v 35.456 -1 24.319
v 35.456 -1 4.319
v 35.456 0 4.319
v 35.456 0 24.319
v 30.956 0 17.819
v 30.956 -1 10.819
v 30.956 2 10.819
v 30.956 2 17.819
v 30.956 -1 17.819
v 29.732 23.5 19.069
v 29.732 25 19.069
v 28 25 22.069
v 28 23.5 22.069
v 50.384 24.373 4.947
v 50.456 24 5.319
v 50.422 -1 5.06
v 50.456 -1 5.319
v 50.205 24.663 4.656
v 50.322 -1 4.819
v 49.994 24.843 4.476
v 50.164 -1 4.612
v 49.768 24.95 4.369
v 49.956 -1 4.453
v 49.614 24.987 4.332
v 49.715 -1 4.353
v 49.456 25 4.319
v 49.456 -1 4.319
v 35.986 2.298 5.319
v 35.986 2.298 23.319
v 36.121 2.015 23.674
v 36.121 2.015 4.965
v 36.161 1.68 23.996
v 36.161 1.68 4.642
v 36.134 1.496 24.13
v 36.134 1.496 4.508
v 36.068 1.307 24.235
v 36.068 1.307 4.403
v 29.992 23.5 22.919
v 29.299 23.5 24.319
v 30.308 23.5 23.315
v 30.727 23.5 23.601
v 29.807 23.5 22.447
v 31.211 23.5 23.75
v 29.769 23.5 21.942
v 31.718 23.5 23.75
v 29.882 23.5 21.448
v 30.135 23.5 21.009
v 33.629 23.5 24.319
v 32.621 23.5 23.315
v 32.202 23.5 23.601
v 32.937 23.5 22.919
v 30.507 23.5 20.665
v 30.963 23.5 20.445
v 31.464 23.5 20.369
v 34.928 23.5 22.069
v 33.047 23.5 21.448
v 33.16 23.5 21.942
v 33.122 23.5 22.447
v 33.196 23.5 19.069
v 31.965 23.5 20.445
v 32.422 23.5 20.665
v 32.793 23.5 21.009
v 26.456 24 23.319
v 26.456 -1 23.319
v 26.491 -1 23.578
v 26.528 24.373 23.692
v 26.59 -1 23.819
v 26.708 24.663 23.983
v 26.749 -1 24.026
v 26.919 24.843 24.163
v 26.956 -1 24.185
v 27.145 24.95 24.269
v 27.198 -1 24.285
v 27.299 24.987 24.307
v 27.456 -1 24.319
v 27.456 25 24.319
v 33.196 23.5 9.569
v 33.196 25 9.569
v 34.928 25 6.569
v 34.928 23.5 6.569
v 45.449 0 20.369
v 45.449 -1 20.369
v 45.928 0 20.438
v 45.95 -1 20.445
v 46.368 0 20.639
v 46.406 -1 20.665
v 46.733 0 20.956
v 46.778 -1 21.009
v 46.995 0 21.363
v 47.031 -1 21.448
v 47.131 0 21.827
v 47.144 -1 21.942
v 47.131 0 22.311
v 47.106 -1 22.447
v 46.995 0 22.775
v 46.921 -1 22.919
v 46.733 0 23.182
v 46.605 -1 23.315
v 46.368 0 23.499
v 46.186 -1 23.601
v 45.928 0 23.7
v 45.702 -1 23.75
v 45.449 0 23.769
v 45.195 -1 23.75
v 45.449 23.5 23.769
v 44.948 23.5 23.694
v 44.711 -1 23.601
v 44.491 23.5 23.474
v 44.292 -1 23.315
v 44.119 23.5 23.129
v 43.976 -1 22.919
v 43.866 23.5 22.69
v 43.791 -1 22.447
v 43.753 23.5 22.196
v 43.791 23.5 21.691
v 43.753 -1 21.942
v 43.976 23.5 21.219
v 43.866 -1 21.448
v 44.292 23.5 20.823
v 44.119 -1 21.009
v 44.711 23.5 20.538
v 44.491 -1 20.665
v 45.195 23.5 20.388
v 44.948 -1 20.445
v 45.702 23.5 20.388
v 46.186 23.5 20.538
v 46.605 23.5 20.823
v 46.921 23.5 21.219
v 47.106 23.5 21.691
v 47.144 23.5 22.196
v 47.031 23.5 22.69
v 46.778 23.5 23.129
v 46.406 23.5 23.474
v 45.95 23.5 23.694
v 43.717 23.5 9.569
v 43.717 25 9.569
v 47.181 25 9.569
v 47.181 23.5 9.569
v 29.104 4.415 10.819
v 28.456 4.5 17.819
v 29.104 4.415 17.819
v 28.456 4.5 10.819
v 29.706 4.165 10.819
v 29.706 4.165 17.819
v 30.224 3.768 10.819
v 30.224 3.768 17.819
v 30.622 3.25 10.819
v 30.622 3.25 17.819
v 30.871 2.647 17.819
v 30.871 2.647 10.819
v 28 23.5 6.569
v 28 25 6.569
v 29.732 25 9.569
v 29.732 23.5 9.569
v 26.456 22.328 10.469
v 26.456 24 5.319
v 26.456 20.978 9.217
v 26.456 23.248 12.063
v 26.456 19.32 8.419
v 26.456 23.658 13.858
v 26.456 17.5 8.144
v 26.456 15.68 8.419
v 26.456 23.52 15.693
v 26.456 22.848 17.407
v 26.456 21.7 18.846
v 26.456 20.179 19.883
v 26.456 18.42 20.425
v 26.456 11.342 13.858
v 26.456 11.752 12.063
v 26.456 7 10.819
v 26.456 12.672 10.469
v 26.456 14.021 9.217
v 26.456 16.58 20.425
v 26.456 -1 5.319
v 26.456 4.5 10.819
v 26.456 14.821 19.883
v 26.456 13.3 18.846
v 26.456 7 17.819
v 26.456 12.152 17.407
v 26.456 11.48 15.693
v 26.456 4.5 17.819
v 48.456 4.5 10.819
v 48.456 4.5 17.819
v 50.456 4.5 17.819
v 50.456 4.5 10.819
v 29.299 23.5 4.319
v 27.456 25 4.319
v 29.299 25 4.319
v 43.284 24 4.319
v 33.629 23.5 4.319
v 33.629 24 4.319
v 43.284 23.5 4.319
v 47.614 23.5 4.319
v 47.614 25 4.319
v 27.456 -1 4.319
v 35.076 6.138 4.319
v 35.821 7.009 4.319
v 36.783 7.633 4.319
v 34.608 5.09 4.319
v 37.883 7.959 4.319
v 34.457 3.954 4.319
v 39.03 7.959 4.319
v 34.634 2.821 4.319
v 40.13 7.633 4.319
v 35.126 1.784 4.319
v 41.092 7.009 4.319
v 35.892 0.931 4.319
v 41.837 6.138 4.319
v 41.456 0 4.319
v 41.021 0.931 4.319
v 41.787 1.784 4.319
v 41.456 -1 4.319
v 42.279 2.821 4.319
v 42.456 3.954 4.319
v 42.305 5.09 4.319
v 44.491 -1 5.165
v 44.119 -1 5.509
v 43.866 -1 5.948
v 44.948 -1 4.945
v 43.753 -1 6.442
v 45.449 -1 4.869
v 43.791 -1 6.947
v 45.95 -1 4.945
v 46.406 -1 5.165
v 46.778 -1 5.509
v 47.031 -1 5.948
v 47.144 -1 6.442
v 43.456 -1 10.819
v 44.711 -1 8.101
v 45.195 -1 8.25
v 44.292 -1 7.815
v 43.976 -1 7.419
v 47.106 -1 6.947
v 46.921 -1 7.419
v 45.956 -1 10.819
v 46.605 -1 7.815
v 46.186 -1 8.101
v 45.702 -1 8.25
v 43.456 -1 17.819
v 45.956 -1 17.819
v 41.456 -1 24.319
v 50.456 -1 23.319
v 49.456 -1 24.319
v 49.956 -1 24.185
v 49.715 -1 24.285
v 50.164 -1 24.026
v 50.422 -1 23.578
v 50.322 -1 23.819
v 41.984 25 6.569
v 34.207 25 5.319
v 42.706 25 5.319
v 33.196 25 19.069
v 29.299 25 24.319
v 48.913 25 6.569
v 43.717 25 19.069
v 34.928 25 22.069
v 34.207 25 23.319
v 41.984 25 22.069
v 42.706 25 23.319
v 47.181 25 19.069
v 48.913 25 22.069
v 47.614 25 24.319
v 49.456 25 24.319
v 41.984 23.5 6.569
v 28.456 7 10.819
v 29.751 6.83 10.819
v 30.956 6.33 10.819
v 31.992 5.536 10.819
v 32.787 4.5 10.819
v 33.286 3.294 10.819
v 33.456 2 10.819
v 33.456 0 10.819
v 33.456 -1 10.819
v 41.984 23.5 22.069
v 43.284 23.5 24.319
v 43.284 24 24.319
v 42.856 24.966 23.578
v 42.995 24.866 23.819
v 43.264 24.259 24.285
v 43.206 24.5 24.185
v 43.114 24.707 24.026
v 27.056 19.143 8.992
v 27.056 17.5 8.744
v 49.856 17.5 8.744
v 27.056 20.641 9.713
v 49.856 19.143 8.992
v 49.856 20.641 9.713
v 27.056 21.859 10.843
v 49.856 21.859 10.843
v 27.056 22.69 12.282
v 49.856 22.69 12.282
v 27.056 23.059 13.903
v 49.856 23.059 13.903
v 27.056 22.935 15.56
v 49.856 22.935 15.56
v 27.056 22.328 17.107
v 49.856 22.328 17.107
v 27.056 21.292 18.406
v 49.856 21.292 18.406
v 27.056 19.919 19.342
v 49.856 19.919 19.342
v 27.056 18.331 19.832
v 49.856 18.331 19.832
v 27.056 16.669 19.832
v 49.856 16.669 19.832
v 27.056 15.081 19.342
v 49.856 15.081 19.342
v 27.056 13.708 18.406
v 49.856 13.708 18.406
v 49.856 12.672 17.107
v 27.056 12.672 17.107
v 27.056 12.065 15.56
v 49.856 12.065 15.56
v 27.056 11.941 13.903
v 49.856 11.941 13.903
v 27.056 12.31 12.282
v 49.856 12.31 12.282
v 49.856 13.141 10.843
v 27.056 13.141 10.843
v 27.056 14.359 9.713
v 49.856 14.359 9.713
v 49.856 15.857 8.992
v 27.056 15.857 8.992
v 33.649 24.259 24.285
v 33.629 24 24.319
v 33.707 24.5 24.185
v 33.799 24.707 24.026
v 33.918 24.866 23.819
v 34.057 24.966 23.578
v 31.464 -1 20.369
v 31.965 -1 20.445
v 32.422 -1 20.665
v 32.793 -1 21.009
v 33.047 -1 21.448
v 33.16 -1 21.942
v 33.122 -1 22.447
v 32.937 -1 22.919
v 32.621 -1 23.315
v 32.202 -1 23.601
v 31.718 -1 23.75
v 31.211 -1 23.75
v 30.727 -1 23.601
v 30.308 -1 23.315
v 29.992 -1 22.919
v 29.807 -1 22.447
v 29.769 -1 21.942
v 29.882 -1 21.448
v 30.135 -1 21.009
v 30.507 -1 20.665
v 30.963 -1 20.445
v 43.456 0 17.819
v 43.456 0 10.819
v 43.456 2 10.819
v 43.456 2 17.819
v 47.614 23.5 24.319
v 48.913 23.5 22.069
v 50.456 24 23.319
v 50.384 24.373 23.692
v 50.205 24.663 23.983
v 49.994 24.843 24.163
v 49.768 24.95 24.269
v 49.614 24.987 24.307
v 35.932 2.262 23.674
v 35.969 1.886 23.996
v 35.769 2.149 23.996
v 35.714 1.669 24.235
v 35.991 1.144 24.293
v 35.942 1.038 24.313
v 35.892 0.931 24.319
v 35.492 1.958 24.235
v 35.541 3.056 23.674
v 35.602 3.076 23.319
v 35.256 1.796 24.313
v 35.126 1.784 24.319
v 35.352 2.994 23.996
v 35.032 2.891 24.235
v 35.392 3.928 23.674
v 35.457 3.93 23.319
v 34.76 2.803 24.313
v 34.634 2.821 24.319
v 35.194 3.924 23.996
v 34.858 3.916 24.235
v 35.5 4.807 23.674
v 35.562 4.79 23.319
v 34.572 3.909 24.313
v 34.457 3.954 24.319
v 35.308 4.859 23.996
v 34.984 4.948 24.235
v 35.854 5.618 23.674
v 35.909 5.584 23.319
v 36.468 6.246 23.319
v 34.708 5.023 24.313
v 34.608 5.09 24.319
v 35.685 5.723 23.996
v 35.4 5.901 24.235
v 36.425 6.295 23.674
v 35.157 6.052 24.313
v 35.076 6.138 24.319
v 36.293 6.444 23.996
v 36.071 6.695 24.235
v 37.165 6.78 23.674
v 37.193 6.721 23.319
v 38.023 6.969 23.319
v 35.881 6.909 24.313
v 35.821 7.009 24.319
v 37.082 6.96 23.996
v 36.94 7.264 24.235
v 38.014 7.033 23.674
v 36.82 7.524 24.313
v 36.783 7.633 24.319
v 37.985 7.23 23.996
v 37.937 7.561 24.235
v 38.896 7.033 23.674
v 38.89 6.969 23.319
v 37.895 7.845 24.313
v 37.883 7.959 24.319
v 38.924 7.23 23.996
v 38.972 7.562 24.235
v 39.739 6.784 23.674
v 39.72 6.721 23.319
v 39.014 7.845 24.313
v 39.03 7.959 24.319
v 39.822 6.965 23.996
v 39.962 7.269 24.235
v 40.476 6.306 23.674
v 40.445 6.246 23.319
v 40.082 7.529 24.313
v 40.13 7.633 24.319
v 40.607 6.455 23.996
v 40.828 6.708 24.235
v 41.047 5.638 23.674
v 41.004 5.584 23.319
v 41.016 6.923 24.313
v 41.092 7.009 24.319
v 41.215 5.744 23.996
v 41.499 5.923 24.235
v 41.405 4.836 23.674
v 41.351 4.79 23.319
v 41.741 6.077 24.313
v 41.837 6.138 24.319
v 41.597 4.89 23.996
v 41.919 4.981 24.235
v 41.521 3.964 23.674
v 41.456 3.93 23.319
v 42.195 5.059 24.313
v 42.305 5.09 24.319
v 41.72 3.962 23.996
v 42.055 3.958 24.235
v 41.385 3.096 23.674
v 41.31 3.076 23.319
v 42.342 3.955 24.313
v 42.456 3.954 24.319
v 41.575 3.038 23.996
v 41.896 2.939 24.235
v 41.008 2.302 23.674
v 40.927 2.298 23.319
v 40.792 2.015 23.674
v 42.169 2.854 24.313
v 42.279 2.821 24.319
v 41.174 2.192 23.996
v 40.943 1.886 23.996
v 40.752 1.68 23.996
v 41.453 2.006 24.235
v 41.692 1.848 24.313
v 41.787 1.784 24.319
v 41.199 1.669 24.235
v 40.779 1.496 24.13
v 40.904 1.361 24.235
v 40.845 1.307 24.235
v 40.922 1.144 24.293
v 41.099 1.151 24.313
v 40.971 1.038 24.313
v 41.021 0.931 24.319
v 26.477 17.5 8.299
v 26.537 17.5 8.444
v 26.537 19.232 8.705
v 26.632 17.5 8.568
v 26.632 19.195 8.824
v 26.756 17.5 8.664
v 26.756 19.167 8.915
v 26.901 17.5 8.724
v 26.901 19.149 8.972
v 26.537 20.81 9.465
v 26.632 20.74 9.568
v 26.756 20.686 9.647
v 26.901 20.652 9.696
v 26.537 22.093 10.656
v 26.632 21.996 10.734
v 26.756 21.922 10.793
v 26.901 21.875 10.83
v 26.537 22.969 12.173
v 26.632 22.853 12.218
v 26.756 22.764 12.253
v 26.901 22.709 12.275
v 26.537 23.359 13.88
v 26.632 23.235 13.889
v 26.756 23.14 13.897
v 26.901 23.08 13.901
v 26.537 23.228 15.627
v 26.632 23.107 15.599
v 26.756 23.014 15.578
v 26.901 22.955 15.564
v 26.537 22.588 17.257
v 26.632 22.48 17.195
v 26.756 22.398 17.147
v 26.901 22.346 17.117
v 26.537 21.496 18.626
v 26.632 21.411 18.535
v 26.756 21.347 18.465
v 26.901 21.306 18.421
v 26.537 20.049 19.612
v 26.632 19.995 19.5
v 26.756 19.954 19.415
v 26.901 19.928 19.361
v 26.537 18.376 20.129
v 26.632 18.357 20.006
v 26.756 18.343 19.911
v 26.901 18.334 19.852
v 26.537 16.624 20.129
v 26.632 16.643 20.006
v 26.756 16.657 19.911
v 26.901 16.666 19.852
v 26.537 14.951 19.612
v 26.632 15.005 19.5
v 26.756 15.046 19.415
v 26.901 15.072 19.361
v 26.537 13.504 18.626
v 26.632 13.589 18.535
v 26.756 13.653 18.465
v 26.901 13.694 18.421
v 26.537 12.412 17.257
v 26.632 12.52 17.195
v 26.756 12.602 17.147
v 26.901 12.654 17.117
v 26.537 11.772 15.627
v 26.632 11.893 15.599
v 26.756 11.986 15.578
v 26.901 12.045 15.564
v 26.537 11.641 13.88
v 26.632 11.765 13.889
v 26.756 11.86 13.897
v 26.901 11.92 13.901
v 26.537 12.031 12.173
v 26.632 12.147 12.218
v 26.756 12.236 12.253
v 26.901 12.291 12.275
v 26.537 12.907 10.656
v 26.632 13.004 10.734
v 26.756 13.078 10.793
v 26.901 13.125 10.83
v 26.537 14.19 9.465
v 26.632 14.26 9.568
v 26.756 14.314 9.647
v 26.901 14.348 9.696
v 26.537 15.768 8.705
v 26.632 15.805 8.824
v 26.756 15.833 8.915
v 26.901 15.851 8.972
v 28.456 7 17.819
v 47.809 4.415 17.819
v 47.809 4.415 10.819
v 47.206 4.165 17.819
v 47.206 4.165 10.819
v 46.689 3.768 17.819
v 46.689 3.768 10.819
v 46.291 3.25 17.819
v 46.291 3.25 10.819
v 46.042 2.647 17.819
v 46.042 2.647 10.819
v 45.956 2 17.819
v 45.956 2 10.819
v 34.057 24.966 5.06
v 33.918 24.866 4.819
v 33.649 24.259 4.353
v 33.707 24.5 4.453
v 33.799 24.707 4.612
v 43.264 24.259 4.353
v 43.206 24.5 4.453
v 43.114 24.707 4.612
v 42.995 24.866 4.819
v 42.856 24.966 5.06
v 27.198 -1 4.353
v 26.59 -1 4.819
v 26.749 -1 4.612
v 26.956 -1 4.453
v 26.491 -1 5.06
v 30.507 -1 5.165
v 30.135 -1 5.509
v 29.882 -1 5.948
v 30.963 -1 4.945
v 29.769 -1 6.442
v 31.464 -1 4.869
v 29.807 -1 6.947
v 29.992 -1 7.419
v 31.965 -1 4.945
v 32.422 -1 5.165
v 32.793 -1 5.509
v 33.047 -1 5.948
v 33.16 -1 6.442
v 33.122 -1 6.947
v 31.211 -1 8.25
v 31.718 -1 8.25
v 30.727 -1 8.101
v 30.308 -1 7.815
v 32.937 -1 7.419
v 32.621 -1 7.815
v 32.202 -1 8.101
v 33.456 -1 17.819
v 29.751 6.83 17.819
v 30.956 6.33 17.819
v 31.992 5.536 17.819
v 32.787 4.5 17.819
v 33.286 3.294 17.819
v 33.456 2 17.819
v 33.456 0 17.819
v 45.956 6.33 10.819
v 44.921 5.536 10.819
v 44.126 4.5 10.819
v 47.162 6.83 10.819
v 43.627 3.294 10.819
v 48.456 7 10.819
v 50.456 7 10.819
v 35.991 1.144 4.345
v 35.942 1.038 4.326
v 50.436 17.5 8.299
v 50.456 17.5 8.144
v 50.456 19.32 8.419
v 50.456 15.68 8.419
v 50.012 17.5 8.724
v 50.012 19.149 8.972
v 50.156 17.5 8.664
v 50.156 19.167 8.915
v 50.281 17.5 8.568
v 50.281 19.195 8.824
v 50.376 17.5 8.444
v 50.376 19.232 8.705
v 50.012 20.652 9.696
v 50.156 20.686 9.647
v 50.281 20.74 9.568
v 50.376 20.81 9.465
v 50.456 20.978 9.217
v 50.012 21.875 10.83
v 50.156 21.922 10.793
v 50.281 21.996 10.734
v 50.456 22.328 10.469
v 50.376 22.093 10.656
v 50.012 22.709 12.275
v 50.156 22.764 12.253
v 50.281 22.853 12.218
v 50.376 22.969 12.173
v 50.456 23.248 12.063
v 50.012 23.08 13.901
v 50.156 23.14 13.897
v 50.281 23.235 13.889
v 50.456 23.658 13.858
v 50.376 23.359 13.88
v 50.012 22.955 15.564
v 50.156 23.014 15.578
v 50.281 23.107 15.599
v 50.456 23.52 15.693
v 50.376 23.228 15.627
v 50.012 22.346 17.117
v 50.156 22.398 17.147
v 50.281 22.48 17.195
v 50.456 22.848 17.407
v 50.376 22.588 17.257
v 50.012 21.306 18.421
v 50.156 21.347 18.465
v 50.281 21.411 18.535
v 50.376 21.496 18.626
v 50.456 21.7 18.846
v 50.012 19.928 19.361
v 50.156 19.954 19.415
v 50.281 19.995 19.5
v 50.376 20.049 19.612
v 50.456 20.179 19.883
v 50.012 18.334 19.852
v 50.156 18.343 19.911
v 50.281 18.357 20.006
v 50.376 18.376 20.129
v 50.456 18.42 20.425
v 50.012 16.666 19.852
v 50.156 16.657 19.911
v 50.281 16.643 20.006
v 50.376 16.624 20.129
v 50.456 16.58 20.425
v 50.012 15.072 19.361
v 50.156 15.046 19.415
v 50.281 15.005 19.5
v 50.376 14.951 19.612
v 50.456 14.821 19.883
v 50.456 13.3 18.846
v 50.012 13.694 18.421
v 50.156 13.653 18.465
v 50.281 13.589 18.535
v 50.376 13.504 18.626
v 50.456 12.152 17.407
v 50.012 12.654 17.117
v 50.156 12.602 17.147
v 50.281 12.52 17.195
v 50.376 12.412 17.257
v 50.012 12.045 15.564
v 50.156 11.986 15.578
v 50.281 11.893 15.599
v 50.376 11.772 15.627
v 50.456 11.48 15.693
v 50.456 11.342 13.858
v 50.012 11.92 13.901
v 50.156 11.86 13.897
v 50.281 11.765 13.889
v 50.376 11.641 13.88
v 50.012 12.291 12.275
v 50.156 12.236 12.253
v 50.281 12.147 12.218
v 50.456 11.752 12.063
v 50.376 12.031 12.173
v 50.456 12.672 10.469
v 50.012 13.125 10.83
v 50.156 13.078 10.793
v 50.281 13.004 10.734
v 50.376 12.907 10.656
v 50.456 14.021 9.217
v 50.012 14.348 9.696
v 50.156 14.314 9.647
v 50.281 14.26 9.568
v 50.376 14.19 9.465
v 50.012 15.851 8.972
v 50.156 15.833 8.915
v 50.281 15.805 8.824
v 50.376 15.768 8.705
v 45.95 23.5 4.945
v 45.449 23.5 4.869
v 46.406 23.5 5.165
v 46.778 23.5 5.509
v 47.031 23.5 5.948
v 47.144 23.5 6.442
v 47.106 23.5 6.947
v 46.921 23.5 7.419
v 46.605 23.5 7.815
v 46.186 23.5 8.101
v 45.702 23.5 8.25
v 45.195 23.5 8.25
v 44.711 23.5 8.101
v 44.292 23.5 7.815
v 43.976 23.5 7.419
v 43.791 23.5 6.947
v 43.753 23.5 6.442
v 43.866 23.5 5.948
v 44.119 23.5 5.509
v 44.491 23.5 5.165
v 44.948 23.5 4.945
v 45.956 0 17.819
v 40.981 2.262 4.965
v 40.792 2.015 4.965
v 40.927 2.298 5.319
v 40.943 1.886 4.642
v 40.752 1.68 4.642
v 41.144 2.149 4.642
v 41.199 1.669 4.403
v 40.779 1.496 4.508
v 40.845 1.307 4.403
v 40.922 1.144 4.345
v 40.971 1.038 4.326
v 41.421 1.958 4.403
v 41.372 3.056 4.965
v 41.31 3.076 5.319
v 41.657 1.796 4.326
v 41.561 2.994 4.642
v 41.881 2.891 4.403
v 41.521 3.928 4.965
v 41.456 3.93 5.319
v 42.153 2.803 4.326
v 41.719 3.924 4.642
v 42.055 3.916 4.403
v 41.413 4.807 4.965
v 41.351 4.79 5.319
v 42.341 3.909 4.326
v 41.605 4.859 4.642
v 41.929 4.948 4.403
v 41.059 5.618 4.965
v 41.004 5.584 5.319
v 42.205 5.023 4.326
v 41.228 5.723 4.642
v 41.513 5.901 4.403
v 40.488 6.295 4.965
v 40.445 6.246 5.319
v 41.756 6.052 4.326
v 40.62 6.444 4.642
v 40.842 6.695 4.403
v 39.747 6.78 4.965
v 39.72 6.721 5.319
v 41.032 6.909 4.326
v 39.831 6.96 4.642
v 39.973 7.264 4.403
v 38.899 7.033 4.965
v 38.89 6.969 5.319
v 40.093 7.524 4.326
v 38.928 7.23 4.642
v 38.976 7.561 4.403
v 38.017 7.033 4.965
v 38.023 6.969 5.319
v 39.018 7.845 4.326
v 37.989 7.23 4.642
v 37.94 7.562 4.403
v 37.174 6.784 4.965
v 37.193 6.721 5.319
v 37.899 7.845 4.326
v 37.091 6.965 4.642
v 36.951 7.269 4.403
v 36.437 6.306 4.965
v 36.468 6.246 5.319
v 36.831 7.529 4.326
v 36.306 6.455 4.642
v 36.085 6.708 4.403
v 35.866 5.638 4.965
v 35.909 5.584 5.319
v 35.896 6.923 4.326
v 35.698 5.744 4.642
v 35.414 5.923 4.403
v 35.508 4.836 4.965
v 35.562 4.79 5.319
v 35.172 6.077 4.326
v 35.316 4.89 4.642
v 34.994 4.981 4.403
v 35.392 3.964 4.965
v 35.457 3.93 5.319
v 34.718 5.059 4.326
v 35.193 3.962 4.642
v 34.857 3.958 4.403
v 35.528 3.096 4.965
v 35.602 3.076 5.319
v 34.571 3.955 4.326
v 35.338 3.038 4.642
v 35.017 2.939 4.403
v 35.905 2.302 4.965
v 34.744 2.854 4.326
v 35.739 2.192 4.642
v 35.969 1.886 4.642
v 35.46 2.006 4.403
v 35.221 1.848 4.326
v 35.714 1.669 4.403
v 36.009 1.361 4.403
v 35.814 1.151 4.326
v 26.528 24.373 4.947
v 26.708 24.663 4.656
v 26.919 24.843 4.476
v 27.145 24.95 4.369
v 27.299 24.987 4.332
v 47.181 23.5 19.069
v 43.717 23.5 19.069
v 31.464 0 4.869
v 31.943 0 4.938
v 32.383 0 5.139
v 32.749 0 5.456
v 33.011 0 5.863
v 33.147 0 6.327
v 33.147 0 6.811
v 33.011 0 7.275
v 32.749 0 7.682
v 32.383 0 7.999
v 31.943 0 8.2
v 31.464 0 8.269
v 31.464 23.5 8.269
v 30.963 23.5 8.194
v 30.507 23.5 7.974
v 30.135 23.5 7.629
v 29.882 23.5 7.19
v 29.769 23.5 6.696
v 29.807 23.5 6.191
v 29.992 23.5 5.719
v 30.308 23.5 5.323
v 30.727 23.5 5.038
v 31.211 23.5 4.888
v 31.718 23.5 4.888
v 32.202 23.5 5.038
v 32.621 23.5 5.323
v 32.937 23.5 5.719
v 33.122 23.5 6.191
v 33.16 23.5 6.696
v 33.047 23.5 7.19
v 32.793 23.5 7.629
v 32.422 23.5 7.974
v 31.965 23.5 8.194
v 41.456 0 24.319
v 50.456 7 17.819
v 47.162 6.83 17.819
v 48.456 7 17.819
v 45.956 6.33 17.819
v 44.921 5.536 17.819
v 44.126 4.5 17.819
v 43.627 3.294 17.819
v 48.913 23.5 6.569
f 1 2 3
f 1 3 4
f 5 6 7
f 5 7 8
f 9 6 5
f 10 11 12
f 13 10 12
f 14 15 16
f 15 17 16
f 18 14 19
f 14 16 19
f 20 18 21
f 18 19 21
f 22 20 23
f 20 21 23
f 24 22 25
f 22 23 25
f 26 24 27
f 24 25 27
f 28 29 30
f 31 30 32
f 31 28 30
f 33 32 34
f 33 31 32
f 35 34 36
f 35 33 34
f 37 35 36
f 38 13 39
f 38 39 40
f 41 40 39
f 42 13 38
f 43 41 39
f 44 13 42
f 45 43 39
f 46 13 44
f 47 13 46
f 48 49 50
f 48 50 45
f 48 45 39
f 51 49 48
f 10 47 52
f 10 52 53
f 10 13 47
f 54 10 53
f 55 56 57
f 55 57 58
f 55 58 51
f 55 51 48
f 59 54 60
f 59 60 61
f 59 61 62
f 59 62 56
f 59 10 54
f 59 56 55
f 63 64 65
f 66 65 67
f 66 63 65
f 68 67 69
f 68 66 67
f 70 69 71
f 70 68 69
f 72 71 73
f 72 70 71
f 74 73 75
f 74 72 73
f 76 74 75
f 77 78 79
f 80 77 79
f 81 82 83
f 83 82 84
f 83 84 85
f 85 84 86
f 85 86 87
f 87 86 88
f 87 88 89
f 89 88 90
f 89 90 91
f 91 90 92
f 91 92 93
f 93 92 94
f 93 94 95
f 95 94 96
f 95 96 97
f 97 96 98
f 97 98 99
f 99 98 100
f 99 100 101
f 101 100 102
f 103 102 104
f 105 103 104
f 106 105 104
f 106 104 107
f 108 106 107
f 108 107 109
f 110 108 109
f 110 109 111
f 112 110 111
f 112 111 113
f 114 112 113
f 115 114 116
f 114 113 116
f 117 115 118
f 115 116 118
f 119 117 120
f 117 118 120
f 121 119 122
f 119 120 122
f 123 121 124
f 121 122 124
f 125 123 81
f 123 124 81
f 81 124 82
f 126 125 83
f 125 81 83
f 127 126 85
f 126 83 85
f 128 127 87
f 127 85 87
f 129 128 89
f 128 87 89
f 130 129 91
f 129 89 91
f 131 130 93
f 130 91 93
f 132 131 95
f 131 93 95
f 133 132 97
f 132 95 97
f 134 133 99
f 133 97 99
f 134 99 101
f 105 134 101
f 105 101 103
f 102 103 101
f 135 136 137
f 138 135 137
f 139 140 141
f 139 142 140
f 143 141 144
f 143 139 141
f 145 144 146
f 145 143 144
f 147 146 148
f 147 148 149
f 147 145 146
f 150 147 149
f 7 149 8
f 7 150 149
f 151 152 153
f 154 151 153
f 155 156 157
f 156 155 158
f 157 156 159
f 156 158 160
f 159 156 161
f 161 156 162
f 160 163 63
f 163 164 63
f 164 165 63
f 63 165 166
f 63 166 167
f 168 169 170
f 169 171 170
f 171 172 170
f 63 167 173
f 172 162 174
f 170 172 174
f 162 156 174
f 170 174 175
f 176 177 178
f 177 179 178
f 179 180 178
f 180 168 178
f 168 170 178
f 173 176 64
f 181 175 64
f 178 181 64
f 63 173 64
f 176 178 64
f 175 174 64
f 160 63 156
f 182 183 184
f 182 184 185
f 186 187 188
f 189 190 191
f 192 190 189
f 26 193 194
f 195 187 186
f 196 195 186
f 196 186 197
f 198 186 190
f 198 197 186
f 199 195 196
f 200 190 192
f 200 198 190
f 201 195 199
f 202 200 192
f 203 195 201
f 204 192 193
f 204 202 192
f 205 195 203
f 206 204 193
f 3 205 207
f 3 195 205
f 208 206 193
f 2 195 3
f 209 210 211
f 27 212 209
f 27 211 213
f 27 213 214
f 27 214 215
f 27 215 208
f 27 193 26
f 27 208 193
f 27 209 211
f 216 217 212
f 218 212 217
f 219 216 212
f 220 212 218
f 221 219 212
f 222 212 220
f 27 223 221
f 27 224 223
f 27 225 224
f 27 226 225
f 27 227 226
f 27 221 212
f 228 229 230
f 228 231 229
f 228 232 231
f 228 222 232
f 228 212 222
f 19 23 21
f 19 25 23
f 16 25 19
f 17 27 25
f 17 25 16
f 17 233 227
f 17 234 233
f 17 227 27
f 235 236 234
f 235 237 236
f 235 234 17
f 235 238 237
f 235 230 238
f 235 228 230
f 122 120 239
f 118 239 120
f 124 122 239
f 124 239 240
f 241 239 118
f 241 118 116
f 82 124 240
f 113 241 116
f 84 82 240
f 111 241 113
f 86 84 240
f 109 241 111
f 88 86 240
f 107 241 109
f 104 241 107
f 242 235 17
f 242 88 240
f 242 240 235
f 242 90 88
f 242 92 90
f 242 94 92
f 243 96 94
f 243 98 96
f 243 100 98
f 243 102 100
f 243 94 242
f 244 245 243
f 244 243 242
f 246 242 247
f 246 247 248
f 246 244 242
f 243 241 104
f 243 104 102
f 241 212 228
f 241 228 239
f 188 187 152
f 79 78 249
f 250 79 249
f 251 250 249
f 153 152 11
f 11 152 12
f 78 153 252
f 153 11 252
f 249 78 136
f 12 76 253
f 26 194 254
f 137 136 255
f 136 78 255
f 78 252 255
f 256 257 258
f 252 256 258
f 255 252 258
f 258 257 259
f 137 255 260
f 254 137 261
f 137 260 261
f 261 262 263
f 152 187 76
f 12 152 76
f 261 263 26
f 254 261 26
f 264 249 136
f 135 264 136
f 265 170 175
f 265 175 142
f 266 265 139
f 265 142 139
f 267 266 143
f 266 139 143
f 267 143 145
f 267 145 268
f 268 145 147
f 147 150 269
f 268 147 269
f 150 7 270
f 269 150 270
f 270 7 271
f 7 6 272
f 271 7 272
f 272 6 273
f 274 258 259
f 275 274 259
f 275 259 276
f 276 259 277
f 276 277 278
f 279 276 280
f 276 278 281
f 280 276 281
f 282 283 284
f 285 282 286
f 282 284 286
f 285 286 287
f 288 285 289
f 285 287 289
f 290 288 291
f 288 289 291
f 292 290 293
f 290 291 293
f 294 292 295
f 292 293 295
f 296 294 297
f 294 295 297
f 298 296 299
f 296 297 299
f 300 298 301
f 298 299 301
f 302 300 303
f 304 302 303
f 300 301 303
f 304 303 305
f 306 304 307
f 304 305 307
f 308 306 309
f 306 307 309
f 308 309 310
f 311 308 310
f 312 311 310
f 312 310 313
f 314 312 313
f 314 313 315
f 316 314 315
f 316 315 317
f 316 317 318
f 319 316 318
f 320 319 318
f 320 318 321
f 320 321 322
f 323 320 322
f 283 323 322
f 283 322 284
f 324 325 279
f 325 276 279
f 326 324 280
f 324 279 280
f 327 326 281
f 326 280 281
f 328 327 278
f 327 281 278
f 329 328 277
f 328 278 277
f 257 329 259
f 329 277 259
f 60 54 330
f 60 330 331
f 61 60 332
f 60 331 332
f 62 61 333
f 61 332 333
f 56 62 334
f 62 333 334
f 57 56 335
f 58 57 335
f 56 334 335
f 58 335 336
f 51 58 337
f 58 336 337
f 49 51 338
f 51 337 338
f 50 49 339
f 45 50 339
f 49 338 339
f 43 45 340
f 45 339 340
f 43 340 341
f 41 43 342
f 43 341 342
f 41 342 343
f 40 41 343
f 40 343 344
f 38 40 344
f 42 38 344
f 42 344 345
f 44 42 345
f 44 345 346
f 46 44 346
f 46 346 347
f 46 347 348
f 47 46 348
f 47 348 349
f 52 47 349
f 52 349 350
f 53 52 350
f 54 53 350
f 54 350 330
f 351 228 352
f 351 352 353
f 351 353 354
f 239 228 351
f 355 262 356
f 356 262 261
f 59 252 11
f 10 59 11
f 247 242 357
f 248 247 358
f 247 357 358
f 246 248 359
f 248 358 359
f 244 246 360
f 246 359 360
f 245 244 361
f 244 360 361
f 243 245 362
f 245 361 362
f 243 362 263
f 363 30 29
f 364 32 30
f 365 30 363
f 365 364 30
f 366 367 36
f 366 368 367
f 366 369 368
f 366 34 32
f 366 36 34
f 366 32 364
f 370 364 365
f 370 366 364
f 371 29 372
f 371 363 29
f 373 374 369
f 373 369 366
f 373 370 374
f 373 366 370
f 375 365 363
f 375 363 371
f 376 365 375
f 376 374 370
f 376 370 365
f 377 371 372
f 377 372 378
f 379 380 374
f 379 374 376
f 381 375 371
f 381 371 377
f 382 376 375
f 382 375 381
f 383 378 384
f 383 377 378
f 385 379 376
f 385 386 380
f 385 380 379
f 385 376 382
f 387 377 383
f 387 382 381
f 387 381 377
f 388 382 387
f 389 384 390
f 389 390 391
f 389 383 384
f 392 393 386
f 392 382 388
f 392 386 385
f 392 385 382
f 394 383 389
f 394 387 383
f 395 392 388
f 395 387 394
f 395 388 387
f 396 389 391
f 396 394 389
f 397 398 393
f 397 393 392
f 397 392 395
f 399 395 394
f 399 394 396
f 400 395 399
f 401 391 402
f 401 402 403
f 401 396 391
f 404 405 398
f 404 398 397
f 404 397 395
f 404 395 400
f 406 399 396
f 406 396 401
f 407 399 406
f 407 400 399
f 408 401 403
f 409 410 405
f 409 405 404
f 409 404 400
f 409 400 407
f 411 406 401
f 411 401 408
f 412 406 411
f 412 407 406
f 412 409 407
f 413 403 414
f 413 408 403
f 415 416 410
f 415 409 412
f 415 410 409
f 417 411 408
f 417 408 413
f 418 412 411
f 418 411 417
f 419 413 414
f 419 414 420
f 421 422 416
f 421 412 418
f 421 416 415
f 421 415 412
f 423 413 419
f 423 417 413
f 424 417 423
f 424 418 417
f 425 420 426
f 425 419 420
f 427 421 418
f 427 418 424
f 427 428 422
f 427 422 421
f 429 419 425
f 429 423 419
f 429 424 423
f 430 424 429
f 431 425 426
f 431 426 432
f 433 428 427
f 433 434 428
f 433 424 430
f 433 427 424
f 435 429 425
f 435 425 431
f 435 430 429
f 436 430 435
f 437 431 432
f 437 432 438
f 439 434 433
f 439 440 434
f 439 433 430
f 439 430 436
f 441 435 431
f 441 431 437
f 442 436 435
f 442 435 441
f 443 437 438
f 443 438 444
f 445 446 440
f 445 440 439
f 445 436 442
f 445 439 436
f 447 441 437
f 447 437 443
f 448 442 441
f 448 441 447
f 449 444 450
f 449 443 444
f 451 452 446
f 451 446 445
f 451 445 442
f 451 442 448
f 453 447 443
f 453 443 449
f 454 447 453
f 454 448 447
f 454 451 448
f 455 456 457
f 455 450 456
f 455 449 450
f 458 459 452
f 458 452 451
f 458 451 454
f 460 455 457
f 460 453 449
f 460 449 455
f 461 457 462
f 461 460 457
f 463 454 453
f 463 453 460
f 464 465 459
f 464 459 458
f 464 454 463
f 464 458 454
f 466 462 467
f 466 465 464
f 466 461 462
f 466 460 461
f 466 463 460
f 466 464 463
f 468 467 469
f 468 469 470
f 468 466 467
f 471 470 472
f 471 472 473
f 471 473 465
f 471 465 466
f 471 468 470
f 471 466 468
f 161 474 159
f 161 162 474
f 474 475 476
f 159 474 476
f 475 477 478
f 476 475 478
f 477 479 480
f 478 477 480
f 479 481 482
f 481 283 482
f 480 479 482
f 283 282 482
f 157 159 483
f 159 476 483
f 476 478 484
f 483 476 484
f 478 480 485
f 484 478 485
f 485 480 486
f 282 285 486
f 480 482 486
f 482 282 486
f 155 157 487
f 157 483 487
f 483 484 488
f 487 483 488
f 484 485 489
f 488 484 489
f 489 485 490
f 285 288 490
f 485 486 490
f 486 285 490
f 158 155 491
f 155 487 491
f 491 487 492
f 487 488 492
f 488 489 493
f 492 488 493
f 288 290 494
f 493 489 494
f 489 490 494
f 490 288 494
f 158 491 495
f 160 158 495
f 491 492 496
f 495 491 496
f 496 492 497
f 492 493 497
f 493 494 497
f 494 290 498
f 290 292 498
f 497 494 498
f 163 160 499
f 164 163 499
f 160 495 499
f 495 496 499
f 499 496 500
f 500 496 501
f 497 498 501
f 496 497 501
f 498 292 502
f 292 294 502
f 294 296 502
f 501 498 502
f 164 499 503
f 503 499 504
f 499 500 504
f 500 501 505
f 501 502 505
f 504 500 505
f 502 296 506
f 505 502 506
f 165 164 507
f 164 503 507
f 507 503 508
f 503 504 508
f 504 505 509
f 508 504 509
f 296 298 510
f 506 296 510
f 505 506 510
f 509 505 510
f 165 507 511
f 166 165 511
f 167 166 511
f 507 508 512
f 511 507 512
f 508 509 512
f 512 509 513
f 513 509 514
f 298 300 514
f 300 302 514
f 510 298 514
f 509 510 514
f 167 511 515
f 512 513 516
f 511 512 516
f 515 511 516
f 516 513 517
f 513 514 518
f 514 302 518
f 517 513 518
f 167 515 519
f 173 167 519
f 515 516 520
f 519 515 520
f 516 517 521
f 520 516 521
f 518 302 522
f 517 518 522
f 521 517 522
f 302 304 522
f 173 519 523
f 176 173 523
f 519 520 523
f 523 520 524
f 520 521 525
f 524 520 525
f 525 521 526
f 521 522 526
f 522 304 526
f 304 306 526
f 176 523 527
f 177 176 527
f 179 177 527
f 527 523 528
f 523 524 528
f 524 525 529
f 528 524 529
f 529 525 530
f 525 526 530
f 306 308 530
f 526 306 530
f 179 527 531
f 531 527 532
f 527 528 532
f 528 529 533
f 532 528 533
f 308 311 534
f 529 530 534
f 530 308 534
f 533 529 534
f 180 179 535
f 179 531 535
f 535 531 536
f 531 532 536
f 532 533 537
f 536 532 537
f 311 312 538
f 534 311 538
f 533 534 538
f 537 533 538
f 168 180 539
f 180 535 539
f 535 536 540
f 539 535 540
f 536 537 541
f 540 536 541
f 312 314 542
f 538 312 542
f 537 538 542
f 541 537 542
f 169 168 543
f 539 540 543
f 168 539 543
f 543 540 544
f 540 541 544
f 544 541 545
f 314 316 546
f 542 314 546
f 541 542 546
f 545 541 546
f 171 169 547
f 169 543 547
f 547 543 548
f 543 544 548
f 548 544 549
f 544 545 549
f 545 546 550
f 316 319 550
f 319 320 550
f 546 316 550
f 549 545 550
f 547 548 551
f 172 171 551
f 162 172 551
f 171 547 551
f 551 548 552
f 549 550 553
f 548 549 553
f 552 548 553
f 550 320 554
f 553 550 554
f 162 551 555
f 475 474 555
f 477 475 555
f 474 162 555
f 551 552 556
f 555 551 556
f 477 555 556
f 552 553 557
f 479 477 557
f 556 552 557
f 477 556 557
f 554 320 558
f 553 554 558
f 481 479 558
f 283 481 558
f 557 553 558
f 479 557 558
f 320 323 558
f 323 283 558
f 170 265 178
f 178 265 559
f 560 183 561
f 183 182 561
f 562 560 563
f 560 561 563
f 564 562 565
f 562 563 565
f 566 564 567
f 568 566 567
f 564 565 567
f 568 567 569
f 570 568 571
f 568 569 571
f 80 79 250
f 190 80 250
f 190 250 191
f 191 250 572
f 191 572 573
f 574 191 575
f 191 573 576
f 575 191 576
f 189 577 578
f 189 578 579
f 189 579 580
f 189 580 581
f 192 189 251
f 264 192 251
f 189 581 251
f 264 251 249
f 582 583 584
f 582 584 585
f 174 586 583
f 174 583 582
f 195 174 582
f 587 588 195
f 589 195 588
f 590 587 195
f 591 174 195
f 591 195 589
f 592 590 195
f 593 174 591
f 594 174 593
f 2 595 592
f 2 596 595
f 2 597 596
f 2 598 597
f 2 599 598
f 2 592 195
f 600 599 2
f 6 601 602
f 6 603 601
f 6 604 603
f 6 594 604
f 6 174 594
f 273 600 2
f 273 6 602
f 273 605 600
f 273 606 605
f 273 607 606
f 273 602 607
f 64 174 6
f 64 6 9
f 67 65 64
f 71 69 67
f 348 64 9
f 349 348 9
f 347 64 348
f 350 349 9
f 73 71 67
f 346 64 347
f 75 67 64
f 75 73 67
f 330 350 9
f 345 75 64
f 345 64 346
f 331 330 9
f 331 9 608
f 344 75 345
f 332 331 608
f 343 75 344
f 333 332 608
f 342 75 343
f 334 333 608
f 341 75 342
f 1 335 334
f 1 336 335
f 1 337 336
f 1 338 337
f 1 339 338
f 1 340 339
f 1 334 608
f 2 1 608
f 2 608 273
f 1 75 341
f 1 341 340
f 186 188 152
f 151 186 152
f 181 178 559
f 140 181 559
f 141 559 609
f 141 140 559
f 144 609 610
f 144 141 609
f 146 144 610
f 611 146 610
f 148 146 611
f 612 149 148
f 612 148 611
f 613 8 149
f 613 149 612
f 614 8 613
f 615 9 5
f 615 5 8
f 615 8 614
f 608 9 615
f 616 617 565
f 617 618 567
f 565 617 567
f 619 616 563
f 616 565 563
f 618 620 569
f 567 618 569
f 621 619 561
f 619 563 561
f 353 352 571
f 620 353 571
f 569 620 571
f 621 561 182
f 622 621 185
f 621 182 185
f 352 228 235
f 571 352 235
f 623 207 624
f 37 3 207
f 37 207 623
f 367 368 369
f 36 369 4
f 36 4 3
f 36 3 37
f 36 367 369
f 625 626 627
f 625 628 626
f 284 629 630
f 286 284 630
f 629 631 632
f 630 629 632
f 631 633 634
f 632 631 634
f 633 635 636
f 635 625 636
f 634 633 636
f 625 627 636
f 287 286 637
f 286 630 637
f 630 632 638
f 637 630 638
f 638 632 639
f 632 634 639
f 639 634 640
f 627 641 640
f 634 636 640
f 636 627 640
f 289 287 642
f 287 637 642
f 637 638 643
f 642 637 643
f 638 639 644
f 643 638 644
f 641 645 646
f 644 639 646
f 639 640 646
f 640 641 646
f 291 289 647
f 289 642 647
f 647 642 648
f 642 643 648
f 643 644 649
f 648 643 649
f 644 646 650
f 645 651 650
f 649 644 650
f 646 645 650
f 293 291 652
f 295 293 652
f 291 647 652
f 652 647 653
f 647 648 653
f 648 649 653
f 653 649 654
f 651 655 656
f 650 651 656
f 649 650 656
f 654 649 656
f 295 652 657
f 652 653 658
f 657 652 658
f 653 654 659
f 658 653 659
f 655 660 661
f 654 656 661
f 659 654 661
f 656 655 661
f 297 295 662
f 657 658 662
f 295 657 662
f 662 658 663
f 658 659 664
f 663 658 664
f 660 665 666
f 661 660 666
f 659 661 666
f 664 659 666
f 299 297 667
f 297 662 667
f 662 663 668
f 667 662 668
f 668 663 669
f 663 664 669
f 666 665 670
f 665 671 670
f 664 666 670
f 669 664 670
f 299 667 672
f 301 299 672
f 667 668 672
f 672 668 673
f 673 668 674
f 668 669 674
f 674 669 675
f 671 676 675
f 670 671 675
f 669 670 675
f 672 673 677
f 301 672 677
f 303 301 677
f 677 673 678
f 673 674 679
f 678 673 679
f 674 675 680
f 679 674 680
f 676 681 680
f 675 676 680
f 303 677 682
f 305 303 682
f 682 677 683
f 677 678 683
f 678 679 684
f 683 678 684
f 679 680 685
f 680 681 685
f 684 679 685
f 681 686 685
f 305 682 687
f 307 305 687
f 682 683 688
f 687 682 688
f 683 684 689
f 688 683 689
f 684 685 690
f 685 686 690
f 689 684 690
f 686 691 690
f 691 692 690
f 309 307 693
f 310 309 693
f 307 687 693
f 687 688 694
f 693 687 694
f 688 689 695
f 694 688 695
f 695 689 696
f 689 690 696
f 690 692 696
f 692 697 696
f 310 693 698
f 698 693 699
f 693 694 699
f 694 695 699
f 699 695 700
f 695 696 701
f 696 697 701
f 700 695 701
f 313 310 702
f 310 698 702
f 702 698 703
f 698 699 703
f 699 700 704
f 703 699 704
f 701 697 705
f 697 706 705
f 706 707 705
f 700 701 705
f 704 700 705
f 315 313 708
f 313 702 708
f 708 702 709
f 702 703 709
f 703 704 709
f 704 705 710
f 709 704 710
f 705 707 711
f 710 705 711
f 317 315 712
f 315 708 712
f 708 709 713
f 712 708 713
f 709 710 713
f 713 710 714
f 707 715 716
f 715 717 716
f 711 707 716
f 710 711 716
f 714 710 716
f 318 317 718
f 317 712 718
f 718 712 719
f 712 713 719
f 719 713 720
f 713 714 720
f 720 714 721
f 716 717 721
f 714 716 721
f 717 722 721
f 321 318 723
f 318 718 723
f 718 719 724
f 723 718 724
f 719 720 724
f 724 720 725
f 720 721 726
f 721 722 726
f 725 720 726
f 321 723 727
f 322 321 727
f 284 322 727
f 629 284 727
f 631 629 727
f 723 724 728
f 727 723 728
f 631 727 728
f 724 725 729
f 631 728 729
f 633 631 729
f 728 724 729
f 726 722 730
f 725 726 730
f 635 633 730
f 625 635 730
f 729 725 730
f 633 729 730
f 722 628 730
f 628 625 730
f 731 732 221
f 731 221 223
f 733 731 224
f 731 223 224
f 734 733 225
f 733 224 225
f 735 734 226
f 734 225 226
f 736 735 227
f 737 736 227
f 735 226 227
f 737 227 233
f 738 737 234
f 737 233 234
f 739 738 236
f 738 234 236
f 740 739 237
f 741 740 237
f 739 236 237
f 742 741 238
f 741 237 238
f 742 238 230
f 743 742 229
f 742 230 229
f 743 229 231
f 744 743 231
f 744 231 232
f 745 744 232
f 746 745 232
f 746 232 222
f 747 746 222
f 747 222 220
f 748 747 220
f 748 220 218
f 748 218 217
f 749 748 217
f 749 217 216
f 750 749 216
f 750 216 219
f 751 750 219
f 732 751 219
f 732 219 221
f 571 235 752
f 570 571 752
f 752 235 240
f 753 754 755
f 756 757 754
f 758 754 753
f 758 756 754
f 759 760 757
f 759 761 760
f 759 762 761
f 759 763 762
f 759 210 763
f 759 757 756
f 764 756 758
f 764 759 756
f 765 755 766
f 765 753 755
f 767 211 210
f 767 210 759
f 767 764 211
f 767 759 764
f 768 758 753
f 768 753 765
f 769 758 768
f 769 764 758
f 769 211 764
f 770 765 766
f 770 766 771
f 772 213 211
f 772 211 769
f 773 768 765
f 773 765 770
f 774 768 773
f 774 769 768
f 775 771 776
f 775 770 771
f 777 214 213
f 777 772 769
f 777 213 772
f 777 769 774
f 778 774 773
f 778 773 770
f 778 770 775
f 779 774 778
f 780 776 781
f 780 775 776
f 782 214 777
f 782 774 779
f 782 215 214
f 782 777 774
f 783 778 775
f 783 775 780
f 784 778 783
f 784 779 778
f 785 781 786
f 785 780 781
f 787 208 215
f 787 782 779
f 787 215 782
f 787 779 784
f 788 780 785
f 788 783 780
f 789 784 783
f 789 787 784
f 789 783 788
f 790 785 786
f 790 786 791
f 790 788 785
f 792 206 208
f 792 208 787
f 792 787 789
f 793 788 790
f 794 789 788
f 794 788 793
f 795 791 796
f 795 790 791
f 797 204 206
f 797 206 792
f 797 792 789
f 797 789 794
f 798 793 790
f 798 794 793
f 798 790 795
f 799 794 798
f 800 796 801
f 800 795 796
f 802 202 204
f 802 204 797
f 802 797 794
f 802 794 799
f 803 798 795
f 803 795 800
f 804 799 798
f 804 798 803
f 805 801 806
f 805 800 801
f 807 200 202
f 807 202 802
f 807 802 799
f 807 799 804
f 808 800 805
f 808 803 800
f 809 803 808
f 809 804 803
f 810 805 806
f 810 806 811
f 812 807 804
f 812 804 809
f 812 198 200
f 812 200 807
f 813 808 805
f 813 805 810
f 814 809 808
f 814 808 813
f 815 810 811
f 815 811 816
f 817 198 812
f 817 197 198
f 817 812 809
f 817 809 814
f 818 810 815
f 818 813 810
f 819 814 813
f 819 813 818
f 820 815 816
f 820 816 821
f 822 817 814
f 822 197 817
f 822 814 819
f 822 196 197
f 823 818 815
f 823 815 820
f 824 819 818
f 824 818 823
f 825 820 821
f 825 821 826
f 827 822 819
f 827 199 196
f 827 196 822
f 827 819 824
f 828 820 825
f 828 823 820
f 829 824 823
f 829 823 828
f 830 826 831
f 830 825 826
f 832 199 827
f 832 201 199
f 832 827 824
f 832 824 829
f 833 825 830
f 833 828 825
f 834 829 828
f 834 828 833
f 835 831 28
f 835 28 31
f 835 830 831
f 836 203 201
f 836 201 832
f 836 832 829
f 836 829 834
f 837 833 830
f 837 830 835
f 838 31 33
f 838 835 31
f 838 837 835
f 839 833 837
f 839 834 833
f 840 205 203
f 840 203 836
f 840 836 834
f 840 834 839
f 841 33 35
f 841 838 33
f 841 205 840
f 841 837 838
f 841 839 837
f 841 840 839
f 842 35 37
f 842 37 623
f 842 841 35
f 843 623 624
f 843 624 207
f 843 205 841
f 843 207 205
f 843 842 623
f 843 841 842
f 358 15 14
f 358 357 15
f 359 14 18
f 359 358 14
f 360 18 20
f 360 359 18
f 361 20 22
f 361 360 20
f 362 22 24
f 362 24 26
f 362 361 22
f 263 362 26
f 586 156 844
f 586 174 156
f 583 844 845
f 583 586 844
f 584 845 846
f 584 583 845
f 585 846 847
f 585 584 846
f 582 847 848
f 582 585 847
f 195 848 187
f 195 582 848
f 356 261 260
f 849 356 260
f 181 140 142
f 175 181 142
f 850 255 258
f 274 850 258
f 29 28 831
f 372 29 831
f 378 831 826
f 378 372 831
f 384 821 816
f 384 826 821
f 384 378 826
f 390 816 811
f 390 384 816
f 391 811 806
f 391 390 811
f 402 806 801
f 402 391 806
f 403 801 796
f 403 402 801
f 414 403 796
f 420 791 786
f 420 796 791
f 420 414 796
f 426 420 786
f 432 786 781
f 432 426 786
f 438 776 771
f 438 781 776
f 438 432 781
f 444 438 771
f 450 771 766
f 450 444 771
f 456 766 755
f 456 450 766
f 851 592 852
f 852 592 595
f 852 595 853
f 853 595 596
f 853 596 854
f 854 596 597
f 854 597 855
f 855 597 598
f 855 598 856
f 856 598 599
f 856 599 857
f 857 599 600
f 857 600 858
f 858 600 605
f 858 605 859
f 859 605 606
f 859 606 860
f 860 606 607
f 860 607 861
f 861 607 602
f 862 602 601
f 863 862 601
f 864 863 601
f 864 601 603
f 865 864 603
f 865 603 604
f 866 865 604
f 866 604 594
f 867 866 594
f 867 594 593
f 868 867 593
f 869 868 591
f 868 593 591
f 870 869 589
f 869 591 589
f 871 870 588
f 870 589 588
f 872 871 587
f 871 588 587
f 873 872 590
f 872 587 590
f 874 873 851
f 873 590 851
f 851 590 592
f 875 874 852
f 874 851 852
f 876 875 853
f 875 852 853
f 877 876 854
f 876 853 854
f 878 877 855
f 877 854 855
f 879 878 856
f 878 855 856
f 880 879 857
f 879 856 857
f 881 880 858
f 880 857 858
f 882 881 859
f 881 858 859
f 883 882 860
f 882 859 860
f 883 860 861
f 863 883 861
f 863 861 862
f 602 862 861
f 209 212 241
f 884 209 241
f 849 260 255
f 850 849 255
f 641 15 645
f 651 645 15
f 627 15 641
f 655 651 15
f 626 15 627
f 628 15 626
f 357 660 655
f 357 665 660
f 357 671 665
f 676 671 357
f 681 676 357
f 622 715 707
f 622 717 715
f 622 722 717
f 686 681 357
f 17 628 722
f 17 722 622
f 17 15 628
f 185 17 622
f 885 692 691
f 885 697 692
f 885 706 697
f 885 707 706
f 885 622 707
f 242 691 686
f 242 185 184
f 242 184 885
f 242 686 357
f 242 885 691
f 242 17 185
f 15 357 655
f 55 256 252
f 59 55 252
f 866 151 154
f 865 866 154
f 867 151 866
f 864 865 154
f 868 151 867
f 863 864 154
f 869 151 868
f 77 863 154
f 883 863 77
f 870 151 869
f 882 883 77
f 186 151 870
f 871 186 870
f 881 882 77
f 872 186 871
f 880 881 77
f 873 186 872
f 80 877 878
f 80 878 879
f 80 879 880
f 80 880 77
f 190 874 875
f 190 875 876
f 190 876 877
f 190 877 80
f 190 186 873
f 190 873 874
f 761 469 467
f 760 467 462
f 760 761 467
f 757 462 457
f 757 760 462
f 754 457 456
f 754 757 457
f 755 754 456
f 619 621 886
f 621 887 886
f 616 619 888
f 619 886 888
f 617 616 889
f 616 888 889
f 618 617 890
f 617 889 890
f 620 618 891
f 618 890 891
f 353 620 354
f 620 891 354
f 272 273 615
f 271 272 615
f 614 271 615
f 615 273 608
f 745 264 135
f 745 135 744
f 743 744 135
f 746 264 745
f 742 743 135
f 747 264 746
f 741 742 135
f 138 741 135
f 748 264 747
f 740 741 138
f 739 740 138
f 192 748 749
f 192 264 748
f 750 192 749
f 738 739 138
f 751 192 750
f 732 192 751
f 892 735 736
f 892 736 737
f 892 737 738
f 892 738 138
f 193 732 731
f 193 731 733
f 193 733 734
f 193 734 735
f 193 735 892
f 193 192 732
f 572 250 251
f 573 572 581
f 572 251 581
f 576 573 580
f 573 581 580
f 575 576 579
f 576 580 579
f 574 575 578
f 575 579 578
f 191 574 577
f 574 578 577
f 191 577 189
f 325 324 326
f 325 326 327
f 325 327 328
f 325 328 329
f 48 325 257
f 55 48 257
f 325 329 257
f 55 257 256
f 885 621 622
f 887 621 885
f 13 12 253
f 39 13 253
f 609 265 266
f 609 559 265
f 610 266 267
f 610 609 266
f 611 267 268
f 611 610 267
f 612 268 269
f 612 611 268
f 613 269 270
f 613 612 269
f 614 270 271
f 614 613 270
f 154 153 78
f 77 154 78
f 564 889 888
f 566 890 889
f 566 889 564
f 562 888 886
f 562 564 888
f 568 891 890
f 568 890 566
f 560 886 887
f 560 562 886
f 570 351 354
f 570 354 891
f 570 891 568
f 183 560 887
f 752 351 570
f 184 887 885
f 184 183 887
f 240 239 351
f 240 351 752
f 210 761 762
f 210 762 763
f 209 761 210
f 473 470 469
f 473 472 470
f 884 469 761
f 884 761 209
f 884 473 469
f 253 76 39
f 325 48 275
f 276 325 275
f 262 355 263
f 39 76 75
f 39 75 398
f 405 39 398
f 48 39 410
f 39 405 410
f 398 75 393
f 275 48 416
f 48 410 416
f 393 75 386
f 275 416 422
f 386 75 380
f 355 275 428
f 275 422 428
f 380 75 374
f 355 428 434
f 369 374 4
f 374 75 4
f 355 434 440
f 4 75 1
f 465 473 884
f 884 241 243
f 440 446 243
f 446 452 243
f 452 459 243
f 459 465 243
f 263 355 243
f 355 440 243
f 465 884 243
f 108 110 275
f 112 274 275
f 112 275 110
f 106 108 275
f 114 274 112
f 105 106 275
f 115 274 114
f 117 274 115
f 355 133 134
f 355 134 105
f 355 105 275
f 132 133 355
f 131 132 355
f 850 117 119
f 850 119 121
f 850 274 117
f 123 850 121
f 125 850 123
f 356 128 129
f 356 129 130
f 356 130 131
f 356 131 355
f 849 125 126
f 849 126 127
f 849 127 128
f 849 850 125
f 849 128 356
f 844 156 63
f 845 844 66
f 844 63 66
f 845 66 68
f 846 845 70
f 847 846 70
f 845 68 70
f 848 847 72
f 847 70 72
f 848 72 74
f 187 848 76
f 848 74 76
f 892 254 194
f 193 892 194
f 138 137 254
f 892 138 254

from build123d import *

# Parameters (mm, degrees)
CROQUIS1_W              = 24
CROQUIS1_H              = 19.999999388
SALIENTE_EXTRUIR1_DEPTH = 25
CORTAR_EXTRUIR1_DEPTH   = 60.75663166
CROQUIS4_R              = 1.7
CORTAR_EXTRUIR3_DEPTH   = 62.337415173
CROQUIS8_W              = 7
CROQUIS8_H              = 2.5
CORTAR_EXTRUIR7_DEPTH   = 1.5
CROQUIS3_R              = 5.575
CORTAR_EXTRUIR8_DEPTH   = 40
SALIENTE_EXTRUIR2_START = 1
CROQUIS13_W             = 9
CROQUIS13_H             = 19.999999388
CROQUIS13_R             = 1.7
CROQUIS13_W_2           = 2.5
CROQUIS13_H_2           = 7
SALIENTE_EXTRUIR2_DEPTH = 1
SALIENTE_EXTRUIR3_START = 1
CROQUIS14_W             = 9
CROQUIS14_H             = 19.999999388
CROQUIS14_R             = 1.7
CROQUIS14_W_2           = 2.5
CROQUIS14_H_2           = 7
SALIENTE_EXTRUIR3_DEPTH = 1
REDONDEO1_R             = 1
REDONDEO3_R             = 0.6


with BuildPart() as part:
    # Croquis1 → Saliente-Extruir1 (new body)
    with BuildSketch(Plane.XZ):
        with Locations((38.456466898, 14.319199476)):
            Rectangle(CROQUIS1_W, CROQUIS1_H)
    extrude(amount=-SALIENTE_EXTRUIR1_DEPTH)

    # Croquis2 → Cortar-Extruir1 (cut, through all)
    with BuildSketch(Plane.XY.offset(24.31919917)):
        with BuildLine():
            Line((35.456466898, 0), (36.335146555, 1.878679656))
            ThreePointArc((36.335146555, 1.878679656), (38.456466898, 7), (40.577787242, 1.878679656))
            Line((40.577787242, 1.878679656), (41.456466898, 0))
            Line((41.456466898, 0), (35.456466898, 0))
        make_face()
    extrude(amount=-CORTAR_EXTRUIR1_DEPTH, mode=Mode.SUBTRACT)

    # Croquis4 → Cortar-Extruir3 (cut, through all)
    with BuildSketch(Plane.XZ):
        with Locations(Location((31.464341614, 22.069199782, 0), (0, 0, 270))):
            Circle(CROQUIS4_R)
        with Locations(Location((45.448592182, 22.069199782, 0), (0, 0, 90))):
            Circle(CROQUIS4_R)
        with Locations(Location((45.448592182, 6.569198558, 0), (0, 0, 270))):
            Circle(CROQUIS4_R)
        with Locations(Location((31.464341614, 6.569198558, 0), (0, 0, 90))):
            Circle(CROQUIS4_R)
    extrude(amount=-CORTAR_EXTRUIR3_DEPTH, mode=Mode.SUBTRACT)

    # Cortar-Barrer2: sweep along a path in Croquis9
    with BuildLine(Plane(origin=(0, 0, 10.819199782), x_dir=(-1, 0, 0), z_dir=(0, 0, -1))) as cortar_barrer2_path:
        Line((-50.456466898, 6.999998763), (-48.456466898, 6.999998763))
        ThreePointArc((-48.456466898, 6.999998763), (-44.920932992, 5.535532669), (-43.456466898, 1.999998763))
        Line((-43.456466898, 1.999998763), (-43.456466898, -1.237e-06))
    # Croquis8 → Cortar-Barrer2 (sweep, cut)
    with BuildSketch(Plane(origin=(50.456466898, 0, 0), x_dir=(0, 0, -1), z_dir=(1, 0, 0))):
        with Locations((-14.319199782, 5.749998763)):
            Rectangle(CROQUIS8_W, CROQUIS8_H)
    cortar_barrer2 = sweep(path=cortar_barrer2_path.line, mode=Mode.SUBTRACT)

    # Simetría1: Cortar-Barrer2 across plane
    add(cortar_barrer2.mirror(Plane(origin=(38.456466898, 0, 0), x_dir=(0, 0, 1), z_dir=(1, 0, 0))), mode=Mode.SUBTRACT)

    # Croquis11 → Cortar-Extruir7 (cut)
    with BuildSketch(Plane(origin=(0, 25, 0), x_dir=(1, 0, 0), z_dir=(0, 1, 0))):
        Polygon((47.18064299, -19.069199782), (43.716541375, -19.069199782), (41.984490567, -22.069199782), (43.716541375, -25.069199782), (47.18064299, -25.069199782), (48.912693797, -22.069199782), align=None)
        Polygon((34.928443229, -22.069199782), (33.196392422, -19.069199782), (29.732290807, -19.069199782), (28.000239999, -22.069199782), (29.732290807, -25.069199782), (33.196392422, -25.069199782), align=None)
        Polygon((34.928443229, -6.569198558), (33.196392422, -3.569198558), (29.732290807, -3.569198558), (28.000239999, -6.569198558), (29.732290807, -9.569198558), (33.196392422, -9.569198558), align=None)
        Polygon((47.18064299, -9.569198558), (48.912693797, -6.569198558), (47.18064299, -3.569198558), (43.716541375, -3.569198558), (41.984490567, -6.569198558), (43.716541375, -9.569198558), align=None)
    extrude(amount=-CORTAR_EXTRUIR7_DEPTH, mode=Mode.SUBTRACT)

    # Croquis3 → Cortar-Extruir8 (cut)
    with BuildSketch(Plane(origin=(50.456466898, 0, 0), x_dir=(0, 0, -1), z_dir=(1, 0, 0))):
        with Locations((-14.31919917, 17.49999856)):
            Circle(CROQUIS3_R)
    extrude(amount=-CORTAR_EXTRUIR8_DEPTH, mode=Mode.SUBTRACT)

    # Croquis13 → Saliente-Extruir2 (add)
    with BuildSketch(Plane.XZ.offset(SALIENTE_EXTRUIR2_START)):
        with Locations((45.956466898, 14.319199476)):
            Rectangle(CROQUIS13_W, CROQUIS13_H)
        with Locations(Location((45.448592182, 22.069199782, 0), (0, 0, 270))):
            Circle(CROQUIS13_R, mode=Mode.SUBTRACT)
        with Locations(Location((45.448592182, 6.569198558, 0), (0, 0, 270))):
            Circle(CROQUIS13_R, mode=Mode.SUBTRACT)
        with Locations((44.706466898, 14.319199782)):
            Rectangle(CROQUIS13_W_2, CROQUIS13_H_2, mode=Mode.SUBTRACT)
    extrude(amount=-SALIENTE_EXTRUIR2_DEPTH)

    # Croquis14 → Saliente-Extruir3 (add)
    with BuildSketch(Plane.XZ.offset(SALIENTE_EXTRUIR3_START)):
        with Locations((30.956466898, 14.319199476)):
            Rectangle(CROQUIS14_W, CROQUIS14_H)
        with Locations(Location((31.464341614, 22.069199782, 0), (0, 0, 270))):
            Circle(CROQUIS14_R, mode=Mode.SUBTRACT)
        with Locations(Location((31.464341614, 6.569198558, 0), (0, 0, 270))):
            Circle(CROQUIS14_R, mode=Mode.SUBTRACT)
        with Locations((32.206466898, 14.319199782)):
            Rectangle(CROQUIS14_W_2, CROQUIS14_H_2, mode=Mode.SUBTRACT)
    extrude(amount=-SALIENTE_EXTRUIR3_DEPTH)

    # Redondeo1
    redondeo1_edges = [part.edges().sort_by_distance(p)[0] for p in [
        (38.456466898, 25, 24.31919917),
        (38.456466898, 25, 4.319199782),
        (26.456466898, 25, 14.319199476),
        (26.456466898, 12, 4.319199782),
        (26.456466898, 12, 24.31919917),
        (50.456466898, 12, 4.319199782),
        (50.456466898, 25, 14.319199476),
        (50.456466898, 12, 24.31919917),
        (40.577787242, 1.878679656, 14.319199476),
        (36.335146555, 1.878679656, 14.319199476),
        (38.456466898, 7, 4.319199782),
        (38.456466898, 7, 24.31919917),
    ]]
    fillet(redondeo1_edges, radius=REDONDEO1_R)

    # Redondeo3
    redondeo3_edges = [part.edges().sort_by_distance(p)[0] for p in [
        (26.456466898, 17.49999856, 19.89419917),
        (50.456466898, 17.49999856, 19.89419917),
    ]]
    fillet(redondeo3_edges, radius=REDONDEO3_R)


solid = part.part
